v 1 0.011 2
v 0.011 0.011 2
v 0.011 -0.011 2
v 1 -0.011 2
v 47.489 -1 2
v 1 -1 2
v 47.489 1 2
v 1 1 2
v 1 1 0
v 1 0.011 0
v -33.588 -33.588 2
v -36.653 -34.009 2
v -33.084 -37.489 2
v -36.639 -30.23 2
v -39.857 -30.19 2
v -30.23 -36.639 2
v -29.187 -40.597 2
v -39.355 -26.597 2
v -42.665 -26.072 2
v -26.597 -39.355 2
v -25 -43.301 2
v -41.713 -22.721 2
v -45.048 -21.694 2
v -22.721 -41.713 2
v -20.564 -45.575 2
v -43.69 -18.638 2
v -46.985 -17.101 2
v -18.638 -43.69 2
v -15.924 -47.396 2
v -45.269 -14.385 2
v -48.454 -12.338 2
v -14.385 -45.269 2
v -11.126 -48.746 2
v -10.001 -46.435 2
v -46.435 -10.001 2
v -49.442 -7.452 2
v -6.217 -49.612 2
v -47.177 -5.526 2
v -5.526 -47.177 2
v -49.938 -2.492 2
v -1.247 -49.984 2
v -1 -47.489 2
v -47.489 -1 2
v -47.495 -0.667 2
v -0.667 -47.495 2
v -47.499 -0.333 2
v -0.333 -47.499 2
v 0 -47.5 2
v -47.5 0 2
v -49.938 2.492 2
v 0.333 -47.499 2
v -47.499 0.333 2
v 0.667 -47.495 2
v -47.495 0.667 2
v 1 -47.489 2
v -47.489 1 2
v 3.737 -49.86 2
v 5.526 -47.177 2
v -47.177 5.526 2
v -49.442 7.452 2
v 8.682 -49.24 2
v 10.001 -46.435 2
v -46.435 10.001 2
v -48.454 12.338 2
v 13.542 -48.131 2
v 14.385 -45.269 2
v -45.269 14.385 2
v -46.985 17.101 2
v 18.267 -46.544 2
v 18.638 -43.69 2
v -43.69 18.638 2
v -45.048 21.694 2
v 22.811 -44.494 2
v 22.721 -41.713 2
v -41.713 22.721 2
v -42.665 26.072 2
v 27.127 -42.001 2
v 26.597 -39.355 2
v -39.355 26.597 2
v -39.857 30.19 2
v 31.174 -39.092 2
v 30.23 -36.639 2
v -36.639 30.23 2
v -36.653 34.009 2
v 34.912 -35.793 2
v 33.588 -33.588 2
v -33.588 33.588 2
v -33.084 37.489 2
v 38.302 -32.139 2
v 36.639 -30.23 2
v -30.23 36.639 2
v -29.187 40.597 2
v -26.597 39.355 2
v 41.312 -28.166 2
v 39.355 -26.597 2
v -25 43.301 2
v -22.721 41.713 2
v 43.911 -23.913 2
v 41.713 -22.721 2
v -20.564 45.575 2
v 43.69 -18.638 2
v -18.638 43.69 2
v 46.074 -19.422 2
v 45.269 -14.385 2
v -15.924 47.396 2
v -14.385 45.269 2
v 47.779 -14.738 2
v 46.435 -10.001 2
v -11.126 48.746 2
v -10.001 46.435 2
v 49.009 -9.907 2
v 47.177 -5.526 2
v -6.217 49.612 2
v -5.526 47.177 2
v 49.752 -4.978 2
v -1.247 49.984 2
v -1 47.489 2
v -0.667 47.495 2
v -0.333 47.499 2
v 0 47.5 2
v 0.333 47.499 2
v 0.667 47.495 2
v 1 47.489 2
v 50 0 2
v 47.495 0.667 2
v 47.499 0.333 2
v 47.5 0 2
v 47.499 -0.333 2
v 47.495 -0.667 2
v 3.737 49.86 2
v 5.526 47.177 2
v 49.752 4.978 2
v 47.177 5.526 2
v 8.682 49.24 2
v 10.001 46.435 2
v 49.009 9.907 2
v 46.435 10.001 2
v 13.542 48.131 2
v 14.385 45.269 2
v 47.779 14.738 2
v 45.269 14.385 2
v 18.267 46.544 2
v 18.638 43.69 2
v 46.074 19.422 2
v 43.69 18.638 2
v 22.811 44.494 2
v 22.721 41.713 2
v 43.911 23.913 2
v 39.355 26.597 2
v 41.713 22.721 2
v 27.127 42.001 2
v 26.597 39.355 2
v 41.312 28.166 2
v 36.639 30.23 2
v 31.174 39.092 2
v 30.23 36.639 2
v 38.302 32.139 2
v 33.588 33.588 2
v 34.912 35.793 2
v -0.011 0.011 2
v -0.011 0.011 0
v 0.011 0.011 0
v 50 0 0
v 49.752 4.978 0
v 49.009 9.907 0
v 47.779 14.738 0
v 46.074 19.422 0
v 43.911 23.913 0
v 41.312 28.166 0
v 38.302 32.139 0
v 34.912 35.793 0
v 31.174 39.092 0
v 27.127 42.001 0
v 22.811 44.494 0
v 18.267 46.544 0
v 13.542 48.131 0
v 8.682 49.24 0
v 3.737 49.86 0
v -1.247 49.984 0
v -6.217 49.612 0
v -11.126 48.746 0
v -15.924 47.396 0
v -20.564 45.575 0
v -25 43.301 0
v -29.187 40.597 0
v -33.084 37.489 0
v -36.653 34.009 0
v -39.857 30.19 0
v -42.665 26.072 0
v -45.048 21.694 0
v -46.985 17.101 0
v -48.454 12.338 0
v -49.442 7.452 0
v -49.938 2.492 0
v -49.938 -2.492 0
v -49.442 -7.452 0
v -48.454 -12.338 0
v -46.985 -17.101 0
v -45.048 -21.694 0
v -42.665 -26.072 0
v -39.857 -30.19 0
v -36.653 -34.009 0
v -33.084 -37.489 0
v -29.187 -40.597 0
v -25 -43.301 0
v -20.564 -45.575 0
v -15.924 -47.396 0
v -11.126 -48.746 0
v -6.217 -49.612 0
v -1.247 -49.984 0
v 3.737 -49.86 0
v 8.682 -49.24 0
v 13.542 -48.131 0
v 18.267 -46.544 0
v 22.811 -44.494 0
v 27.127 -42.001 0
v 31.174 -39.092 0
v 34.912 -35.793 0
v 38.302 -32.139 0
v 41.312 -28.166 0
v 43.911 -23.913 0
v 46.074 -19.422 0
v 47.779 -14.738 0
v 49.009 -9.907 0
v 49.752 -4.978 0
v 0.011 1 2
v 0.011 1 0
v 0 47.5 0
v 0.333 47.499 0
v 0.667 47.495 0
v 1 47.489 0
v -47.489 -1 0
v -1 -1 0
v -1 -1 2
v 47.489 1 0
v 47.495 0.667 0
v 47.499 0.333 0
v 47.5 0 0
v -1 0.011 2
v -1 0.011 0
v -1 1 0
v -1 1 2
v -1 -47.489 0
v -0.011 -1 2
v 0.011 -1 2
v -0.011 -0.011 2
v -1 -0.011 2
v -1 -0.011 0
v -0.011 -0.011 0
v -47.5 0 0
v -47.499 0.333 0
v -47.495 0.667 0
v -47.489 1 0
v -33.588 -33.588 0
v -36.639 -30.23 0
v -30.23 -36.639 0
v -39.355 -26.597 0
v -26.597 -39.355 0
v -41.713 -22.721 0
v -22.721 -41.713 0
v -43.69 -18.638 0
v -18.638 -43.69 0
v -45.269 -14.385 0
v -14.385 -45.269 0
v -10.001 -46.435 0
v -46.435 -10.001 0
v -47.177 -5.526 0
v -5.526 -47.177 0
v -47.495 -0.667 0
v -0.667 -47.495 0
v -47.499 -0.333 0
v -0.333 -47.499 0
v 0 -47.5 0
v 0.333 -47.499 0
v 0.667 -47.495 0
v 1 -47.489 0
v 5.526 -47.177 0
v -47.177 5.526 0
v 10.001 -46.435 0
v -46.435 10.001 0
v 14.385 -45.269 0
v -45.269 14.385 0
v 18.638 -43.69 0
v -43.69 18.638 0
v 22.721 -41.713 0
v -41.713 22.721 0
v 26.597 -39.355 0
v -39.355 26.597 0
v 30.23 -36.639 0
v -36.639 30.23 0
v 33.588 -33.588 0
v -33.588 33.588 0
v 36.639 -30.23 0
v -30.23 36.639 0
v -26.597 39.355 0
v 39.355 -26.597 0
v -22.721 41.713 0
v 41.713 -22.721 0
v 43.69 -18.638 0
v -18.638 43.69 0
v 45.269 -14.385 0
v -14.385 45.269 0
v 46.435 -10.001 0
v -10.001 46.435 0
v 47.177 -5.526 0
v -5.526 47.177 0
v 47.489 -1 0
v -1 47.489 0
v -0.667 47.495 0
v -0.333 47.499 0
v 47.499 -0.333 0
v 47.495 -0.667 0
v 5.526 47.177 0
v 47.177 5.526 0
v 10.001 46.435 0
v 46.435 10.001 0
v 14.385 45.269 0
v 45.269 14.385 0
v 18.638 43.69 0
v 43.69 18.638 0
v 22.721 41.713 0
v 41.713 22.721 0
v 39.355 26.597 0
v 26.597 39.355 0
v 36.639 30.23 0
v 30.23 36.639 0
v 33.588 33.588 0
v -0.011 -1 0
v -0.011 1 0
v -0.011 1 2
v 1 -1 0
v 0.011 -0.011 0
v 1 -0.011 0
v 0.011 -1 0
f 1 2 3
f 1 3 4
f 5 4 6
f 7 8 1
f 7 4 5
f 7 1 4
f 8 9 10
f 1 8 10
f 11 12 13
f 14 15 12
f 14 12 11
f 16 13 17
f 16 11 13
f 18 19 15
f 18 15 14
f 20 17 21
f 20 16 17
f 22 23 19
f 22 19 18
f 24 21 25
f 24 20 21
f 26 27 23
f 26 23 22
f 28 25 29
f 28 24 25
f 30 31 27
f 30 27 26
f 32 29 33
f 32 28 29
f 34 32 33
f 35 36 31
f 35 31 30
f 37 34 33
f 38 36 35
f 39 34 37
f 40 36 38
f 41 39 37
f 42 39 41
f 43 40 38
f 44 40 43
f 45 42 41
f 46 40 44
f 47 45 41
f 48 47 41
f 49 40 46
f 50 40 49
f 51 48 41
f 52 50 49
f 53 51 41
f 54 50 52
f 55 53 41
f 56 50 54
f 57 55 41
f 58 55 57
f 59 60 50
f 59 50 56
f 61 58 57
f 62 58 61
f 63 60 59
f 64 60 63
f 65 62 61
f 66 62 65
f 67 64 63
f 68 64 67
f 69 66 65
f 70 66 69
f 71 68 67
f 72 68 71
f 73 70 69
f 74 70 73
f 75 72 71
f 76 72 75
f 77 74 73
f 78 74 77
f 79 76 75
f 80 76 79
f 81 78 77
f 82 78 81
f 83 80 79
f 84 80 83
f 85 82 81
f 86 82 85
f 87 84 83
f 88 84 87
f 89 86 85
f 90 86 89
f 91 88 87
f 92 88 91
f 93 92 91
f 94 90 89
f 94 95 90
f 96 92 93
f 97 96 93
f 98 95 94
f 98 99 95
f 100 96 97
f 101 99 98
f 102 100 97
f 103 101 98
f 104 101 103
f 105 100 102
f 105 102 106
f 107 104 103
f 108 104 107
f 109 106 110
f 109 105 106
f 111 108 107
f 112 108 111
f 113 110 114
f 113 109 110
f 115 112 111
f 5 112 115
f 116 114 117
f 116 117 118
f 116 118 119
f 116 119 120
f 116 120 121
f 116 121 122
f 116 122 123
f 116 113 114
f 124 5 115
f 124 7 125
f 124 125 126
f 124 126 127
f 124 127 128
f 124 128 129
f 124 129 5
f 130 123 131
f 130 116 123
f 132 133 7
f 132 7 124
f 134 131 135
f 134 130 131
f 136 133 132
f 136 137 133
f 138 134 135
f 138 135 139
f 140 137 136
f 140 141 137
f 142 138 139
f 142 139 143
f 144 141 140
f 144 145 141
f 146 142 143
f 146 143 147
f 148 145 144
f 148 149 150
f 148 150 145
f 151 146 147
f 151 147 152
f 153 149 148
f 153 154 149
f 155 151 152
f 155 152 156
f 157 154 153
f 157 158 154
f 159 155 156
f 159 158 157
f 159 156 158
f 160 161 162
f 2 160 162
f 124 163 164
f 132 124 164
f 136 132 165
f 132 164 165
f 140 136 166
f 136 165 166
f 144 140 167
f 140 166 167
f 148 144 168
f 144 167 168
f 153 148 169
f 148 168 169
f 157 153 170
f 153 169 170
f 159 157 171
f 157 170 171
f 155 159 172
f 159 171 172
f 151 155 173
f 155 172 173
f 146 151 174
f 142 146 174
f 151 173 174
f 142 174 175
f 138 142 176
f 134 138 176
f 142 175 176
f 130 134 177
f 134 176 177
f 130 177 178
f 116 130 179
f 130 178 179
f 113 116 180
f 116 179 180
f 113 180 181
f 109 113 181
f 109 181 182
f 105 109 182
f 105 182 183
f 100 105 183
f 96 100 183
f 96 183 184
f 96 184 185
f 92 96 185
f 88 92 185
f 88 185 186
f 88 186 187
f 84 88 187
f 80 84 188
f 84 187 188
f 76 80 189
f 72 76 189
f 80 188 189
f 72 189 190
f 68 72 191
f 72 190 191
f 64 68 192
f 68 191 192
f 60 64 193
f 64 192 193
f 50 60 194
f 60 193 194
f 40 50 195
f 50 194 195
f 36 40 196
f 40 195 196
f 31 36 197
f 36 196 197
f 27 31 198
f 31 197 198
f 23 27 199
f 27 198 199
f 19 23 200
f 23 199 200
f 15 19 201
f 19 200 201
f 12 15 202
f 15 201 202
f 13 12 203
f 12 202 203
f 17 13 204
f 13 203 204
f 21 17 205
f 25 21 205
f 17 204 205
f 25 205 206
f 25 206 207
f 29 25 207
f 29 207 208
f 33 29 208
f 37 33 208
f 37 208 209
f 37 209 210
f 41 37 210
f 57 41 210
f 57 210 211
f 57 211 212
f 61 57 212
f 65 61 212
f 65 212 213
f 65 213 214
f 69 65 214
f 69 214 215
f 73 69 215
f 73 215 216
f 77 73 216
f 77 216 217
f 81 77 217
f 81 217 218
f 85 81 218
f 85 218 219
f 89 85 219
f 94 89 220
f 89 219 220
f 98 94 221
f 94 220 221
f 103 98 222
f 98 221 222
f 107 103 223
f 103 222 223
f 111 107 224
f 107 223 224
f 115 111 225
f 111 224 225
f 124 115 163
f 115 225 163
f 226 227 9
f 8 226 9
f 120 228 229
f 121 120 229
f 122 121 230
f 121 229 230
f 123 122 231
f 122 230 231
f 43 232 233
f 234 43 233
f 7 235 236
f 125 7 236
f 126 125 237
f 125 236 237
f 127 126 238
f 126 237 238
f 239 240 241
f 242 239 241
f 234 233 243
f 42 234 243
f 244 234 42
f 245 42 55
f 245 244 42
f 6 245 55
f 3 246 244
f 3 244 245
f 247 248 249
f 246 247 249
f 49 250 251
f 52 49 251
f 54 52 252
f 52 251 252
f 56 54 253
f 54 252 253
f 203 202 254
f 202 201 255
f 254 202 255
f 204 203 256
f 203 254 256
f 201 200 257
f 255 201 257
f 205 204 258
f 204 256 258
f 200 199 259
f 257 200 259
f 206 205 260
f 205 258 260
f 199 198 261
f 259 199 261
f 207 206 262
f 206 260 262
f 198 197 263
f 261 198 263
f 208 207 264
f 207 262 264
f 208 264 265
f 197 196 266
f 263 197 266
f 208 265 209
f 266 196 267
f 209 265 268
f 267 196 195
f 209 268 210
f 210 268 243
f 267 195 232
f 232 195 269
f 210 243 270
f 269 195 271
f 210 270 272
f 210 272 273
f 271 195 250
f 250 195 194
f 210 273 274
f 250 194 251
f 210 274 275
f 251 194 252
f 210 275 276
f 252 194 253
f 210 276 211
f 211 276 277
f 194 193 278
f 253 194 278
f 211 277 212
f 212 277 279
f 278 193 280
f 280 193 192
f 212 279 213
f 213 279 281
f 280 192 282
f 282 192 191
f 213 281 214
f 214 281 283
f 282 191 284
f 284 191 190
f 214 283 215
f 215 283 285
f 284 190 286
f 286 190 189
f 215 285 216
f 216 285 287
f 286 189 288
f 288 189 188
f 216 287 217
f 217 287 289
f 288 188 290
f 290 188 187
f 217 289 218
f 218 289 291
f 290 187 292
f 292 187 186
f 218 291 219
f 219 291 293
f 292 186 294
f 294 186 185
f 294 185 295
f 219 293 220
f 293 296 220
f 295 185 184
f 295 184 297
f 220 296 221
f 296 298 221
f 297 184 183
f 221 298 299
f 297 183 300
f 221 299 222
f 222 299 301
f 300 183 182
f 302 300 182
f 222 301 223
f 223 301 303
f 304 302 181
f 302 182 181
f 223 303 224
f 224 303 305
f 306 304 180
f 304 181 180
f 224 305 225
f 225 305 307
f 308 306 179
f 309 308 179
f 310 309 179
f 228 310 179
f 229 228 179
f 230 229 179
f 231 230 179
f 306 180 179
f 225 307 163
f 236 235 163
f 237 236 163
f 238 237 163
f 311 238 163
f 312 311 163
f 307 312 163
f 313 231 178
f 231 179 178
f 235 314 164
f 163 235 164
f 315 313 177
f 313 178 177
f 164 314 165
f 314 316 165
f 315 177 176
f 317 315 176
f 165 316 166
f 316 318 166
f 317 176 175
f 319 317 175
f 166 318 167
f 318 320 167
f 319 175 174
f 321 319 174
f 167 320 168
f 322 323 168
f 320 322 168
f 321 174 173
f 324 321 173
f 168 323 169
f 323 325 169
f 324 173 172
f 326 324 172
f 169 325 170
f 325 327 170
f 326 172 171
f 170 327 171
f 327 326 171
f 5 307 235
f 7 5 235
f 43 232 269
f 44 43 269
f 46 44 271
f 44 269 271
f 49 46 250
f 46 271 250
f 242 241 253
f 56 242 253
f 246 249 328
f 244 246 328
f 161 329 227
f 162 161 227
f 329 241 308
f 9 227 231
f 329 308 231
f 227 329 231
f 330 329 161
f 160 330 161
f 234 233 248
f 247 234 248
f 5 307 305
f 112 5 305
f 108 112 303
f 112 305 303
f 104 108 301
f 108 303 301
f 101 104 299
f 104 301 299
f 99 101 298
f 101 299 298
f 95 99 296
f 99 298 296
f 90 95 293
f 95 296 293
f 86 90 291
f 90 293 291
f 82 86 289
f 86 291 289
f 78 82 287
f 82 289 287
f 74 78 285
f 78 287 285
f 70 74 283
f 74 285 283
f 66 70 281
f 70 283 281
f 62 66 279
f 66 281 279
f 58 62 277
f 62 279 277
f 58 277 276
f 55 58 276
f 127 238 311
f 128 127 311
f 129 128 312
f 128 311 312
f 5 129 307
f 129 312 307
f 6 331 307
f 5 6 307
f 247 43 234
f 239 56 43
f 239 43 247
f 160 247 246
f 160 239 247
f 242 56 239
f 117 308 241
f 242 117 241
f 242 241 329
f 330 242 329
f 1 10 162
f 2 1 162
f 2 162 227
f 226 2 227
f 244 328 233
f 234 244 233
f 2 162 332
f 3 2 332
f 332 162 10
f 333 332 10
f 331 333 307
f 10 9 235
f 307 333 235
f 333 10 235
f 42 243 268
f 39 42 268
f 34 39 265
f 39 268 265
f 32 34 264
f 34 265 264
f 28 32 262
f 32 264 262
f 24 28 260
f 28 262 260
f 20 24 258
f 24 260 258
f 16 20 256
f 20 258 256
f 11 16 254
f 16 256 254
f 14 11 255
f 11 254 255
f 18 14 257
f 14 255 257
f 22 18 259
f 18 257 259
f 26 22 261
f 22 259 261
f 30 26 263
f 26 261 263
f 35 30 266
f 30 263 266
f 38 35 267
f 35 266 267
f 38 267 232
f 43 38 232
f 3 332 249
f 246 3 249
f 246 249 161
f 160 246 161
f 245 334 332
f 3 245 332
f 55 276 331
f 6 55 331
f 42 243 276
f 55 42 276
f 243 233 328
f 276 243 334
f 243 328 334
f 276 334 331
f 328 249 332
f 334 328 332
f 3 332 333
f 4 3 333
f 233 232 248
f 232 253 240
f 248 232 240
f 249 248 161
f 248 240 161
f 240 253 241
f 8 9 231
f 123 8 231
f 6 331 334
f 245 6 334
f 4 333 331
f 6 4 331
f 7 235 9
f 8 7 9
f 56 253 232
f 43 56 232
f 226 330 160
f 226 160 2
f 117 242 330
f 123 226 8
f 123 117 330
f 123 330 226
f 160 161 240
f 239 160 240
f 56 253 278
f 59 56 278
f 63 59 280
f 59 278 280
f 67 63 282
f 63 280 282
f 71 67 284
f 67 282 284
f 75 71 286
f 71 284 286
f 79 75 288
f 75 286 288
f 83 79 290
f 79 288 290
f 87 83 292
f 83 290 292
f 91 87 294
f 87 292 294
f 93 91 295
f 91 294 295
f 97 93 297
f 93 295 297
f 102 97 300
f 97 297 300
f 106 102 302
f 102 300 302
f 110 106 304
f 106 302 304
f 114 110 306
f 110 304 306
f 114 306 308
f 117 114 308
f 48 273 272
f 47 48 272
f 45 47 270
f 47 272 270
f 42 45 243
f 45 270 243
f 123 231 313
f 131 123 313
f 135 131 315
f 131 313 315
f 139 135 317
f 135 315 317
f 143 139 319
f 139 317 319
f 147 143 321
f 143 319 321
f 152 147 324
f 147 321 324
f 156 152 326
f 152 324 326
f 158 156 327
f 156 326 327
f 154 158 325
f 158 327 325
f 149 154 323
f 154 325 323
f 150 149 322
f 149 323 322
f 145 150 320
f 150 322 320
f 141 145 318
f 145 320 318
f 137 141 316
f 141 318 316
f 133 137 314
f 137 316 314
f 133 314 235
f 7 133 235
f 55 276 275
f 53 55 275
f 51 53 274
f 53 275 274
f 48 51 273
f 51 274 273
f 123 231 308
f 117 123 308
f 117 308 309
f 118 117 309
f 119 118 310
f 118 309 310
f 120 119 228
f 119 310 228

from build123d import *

# Parameters (mm, degrees)
F0_R     = 50
F1_DEPTH = 2


with BuildPart() as f1:
    # F0 (on Top) → F1 (new body)
    with BuildSketch(Plane.XY):
        Circle(F0_R)
        with BuildLine():
            ThreePointArc((47.4894725176, 1), (47.4973680565, 0.5000277062), (47.5, 0))
            ThreePointArc((47.5, 0), (47.4973680565, -0.5000277062), (47.4894725176, -1))
            ThreePointArc((47.4894725176, -1), (33.5875721064, -33.5875721064), (1, -47.4894725176))
            ThreePointArc((1, -47.4894725176), (0.5000277062, -47.4973680565), (0, -47.5))
            ThreePointArc((0, -47.5), (-0.5000277062, -47.4973680565), (-1, -47.4894725176))
            ThreePointArc((-1, -47.4894725176), (-33.5875721064, -33.5875721064), (-47.4894725176, -1))
            ThreePointArc((-47.4894725176, -1), (-47.4973680565, -0.5000277062), (-47.5, 0))
            ThreePointArc((-47.5, 0), (-47.4973680565, 0.5000277062), (-47.4894725176, 1))
            ThreePointArc((-47.4894725176, 1), (-33.5875721064, 33.5875721064), (-1, 47.4894725176))
            ThreePointArc((-1, 47.4894725176), (-0.5000277062, 47.4973680565), (0, 47.5))
            ThreePointArc((0, 47.5), (0.5000277062, 47.4973680565), (1, 47.4894725176))
            ThreePointArc((1, 47.4894725176), (33.5875721064, 33.5875721064), (47.4894725176, 1))
        make_face(mode=Mode.SUBTRACT)
    extrude(amount=F1_DEPTH)


with BuildPart() as f1b:
    # F0 (on Top) → F1, piece 2 (new body)
    with BuildSketch(Plane.XY):
        Polygon((-0.0105274824, -0.0105274824), (-0.0105274824, 0), (-47.4894725176, 0), (-47.4894725176, -1), (-1, -1), (-1, -0.0105274824), align=None)
        Polygon((-47.4894725176, 0), (-0.0105274824, 0), (-0.0105274824, 0.0105274824), (-1, 0.0105274824), (-1, 1), (-47.4894725176, 1), align=None)
    extrude(amount=F1_DEPTH)


with BuildPart() as f1c:
    # F0 (on Top) → F1, piece 3 (new body)
    with BuildSketch(Plane.XY):
        Polygon((0, 0.0105274824), (0, 47.4894725176), (-1, 47.4894725176), (-1, 1), (-0.0105274824, 1), (-0.0105274824, 0.0105274824), align=None)
        Polygon((1, 1), (1, 47.4894725176), (0, 47.4894725176), (0, 0.0105274824), (0.0105274824, 0.0105274824), (0.0105274824, 1), align=None)
    extrude(amount=F1_DEPTH)


with BuildPart() as f1d:
    # F0 (on Top) → F1, piece 4 (new body)
    with BuildSketch(Plane.XY):
        Polygon((1, -1), (47.4894725176, -1), (47.4894725176, 0), (0.0105274824, 0), (0.0105274824, -0.0105274824), (1, -0.0105274824), align=None)
        Polygon((47.4894725176, 0), (47.4894725176, 1), (1, 1), (1, 0.0105274824), (0.0105274824, 0.0105274824), (0.0105274824, 0), align=None)
    extrude(amount=F1_DEPTH)


with BuildPart() as f1e:
    # F0 (on Top) → F1, piece 5 (new body)
    with BuildSketch(Plane.XY):
        Polygon((0, -47.4894725176), (1, -47.4894725176), (1, -1), (0.0105274824, -1), (0.0105274824, -0.0105274824), (0, -0.0105274824), align=None)
        Polygon((-1, -47.4894725176), (0, -47.4894725176), (0, -0.0105274824), (-0.0105274824, -0.0105274824), (-0.0105274824, -1), (-1, -1), align=None)
    extrude(amount=F1_DEPTH)


solid = Compound([f1.part, f1b.part, f1c.part, f1d.part, f1e.part])
